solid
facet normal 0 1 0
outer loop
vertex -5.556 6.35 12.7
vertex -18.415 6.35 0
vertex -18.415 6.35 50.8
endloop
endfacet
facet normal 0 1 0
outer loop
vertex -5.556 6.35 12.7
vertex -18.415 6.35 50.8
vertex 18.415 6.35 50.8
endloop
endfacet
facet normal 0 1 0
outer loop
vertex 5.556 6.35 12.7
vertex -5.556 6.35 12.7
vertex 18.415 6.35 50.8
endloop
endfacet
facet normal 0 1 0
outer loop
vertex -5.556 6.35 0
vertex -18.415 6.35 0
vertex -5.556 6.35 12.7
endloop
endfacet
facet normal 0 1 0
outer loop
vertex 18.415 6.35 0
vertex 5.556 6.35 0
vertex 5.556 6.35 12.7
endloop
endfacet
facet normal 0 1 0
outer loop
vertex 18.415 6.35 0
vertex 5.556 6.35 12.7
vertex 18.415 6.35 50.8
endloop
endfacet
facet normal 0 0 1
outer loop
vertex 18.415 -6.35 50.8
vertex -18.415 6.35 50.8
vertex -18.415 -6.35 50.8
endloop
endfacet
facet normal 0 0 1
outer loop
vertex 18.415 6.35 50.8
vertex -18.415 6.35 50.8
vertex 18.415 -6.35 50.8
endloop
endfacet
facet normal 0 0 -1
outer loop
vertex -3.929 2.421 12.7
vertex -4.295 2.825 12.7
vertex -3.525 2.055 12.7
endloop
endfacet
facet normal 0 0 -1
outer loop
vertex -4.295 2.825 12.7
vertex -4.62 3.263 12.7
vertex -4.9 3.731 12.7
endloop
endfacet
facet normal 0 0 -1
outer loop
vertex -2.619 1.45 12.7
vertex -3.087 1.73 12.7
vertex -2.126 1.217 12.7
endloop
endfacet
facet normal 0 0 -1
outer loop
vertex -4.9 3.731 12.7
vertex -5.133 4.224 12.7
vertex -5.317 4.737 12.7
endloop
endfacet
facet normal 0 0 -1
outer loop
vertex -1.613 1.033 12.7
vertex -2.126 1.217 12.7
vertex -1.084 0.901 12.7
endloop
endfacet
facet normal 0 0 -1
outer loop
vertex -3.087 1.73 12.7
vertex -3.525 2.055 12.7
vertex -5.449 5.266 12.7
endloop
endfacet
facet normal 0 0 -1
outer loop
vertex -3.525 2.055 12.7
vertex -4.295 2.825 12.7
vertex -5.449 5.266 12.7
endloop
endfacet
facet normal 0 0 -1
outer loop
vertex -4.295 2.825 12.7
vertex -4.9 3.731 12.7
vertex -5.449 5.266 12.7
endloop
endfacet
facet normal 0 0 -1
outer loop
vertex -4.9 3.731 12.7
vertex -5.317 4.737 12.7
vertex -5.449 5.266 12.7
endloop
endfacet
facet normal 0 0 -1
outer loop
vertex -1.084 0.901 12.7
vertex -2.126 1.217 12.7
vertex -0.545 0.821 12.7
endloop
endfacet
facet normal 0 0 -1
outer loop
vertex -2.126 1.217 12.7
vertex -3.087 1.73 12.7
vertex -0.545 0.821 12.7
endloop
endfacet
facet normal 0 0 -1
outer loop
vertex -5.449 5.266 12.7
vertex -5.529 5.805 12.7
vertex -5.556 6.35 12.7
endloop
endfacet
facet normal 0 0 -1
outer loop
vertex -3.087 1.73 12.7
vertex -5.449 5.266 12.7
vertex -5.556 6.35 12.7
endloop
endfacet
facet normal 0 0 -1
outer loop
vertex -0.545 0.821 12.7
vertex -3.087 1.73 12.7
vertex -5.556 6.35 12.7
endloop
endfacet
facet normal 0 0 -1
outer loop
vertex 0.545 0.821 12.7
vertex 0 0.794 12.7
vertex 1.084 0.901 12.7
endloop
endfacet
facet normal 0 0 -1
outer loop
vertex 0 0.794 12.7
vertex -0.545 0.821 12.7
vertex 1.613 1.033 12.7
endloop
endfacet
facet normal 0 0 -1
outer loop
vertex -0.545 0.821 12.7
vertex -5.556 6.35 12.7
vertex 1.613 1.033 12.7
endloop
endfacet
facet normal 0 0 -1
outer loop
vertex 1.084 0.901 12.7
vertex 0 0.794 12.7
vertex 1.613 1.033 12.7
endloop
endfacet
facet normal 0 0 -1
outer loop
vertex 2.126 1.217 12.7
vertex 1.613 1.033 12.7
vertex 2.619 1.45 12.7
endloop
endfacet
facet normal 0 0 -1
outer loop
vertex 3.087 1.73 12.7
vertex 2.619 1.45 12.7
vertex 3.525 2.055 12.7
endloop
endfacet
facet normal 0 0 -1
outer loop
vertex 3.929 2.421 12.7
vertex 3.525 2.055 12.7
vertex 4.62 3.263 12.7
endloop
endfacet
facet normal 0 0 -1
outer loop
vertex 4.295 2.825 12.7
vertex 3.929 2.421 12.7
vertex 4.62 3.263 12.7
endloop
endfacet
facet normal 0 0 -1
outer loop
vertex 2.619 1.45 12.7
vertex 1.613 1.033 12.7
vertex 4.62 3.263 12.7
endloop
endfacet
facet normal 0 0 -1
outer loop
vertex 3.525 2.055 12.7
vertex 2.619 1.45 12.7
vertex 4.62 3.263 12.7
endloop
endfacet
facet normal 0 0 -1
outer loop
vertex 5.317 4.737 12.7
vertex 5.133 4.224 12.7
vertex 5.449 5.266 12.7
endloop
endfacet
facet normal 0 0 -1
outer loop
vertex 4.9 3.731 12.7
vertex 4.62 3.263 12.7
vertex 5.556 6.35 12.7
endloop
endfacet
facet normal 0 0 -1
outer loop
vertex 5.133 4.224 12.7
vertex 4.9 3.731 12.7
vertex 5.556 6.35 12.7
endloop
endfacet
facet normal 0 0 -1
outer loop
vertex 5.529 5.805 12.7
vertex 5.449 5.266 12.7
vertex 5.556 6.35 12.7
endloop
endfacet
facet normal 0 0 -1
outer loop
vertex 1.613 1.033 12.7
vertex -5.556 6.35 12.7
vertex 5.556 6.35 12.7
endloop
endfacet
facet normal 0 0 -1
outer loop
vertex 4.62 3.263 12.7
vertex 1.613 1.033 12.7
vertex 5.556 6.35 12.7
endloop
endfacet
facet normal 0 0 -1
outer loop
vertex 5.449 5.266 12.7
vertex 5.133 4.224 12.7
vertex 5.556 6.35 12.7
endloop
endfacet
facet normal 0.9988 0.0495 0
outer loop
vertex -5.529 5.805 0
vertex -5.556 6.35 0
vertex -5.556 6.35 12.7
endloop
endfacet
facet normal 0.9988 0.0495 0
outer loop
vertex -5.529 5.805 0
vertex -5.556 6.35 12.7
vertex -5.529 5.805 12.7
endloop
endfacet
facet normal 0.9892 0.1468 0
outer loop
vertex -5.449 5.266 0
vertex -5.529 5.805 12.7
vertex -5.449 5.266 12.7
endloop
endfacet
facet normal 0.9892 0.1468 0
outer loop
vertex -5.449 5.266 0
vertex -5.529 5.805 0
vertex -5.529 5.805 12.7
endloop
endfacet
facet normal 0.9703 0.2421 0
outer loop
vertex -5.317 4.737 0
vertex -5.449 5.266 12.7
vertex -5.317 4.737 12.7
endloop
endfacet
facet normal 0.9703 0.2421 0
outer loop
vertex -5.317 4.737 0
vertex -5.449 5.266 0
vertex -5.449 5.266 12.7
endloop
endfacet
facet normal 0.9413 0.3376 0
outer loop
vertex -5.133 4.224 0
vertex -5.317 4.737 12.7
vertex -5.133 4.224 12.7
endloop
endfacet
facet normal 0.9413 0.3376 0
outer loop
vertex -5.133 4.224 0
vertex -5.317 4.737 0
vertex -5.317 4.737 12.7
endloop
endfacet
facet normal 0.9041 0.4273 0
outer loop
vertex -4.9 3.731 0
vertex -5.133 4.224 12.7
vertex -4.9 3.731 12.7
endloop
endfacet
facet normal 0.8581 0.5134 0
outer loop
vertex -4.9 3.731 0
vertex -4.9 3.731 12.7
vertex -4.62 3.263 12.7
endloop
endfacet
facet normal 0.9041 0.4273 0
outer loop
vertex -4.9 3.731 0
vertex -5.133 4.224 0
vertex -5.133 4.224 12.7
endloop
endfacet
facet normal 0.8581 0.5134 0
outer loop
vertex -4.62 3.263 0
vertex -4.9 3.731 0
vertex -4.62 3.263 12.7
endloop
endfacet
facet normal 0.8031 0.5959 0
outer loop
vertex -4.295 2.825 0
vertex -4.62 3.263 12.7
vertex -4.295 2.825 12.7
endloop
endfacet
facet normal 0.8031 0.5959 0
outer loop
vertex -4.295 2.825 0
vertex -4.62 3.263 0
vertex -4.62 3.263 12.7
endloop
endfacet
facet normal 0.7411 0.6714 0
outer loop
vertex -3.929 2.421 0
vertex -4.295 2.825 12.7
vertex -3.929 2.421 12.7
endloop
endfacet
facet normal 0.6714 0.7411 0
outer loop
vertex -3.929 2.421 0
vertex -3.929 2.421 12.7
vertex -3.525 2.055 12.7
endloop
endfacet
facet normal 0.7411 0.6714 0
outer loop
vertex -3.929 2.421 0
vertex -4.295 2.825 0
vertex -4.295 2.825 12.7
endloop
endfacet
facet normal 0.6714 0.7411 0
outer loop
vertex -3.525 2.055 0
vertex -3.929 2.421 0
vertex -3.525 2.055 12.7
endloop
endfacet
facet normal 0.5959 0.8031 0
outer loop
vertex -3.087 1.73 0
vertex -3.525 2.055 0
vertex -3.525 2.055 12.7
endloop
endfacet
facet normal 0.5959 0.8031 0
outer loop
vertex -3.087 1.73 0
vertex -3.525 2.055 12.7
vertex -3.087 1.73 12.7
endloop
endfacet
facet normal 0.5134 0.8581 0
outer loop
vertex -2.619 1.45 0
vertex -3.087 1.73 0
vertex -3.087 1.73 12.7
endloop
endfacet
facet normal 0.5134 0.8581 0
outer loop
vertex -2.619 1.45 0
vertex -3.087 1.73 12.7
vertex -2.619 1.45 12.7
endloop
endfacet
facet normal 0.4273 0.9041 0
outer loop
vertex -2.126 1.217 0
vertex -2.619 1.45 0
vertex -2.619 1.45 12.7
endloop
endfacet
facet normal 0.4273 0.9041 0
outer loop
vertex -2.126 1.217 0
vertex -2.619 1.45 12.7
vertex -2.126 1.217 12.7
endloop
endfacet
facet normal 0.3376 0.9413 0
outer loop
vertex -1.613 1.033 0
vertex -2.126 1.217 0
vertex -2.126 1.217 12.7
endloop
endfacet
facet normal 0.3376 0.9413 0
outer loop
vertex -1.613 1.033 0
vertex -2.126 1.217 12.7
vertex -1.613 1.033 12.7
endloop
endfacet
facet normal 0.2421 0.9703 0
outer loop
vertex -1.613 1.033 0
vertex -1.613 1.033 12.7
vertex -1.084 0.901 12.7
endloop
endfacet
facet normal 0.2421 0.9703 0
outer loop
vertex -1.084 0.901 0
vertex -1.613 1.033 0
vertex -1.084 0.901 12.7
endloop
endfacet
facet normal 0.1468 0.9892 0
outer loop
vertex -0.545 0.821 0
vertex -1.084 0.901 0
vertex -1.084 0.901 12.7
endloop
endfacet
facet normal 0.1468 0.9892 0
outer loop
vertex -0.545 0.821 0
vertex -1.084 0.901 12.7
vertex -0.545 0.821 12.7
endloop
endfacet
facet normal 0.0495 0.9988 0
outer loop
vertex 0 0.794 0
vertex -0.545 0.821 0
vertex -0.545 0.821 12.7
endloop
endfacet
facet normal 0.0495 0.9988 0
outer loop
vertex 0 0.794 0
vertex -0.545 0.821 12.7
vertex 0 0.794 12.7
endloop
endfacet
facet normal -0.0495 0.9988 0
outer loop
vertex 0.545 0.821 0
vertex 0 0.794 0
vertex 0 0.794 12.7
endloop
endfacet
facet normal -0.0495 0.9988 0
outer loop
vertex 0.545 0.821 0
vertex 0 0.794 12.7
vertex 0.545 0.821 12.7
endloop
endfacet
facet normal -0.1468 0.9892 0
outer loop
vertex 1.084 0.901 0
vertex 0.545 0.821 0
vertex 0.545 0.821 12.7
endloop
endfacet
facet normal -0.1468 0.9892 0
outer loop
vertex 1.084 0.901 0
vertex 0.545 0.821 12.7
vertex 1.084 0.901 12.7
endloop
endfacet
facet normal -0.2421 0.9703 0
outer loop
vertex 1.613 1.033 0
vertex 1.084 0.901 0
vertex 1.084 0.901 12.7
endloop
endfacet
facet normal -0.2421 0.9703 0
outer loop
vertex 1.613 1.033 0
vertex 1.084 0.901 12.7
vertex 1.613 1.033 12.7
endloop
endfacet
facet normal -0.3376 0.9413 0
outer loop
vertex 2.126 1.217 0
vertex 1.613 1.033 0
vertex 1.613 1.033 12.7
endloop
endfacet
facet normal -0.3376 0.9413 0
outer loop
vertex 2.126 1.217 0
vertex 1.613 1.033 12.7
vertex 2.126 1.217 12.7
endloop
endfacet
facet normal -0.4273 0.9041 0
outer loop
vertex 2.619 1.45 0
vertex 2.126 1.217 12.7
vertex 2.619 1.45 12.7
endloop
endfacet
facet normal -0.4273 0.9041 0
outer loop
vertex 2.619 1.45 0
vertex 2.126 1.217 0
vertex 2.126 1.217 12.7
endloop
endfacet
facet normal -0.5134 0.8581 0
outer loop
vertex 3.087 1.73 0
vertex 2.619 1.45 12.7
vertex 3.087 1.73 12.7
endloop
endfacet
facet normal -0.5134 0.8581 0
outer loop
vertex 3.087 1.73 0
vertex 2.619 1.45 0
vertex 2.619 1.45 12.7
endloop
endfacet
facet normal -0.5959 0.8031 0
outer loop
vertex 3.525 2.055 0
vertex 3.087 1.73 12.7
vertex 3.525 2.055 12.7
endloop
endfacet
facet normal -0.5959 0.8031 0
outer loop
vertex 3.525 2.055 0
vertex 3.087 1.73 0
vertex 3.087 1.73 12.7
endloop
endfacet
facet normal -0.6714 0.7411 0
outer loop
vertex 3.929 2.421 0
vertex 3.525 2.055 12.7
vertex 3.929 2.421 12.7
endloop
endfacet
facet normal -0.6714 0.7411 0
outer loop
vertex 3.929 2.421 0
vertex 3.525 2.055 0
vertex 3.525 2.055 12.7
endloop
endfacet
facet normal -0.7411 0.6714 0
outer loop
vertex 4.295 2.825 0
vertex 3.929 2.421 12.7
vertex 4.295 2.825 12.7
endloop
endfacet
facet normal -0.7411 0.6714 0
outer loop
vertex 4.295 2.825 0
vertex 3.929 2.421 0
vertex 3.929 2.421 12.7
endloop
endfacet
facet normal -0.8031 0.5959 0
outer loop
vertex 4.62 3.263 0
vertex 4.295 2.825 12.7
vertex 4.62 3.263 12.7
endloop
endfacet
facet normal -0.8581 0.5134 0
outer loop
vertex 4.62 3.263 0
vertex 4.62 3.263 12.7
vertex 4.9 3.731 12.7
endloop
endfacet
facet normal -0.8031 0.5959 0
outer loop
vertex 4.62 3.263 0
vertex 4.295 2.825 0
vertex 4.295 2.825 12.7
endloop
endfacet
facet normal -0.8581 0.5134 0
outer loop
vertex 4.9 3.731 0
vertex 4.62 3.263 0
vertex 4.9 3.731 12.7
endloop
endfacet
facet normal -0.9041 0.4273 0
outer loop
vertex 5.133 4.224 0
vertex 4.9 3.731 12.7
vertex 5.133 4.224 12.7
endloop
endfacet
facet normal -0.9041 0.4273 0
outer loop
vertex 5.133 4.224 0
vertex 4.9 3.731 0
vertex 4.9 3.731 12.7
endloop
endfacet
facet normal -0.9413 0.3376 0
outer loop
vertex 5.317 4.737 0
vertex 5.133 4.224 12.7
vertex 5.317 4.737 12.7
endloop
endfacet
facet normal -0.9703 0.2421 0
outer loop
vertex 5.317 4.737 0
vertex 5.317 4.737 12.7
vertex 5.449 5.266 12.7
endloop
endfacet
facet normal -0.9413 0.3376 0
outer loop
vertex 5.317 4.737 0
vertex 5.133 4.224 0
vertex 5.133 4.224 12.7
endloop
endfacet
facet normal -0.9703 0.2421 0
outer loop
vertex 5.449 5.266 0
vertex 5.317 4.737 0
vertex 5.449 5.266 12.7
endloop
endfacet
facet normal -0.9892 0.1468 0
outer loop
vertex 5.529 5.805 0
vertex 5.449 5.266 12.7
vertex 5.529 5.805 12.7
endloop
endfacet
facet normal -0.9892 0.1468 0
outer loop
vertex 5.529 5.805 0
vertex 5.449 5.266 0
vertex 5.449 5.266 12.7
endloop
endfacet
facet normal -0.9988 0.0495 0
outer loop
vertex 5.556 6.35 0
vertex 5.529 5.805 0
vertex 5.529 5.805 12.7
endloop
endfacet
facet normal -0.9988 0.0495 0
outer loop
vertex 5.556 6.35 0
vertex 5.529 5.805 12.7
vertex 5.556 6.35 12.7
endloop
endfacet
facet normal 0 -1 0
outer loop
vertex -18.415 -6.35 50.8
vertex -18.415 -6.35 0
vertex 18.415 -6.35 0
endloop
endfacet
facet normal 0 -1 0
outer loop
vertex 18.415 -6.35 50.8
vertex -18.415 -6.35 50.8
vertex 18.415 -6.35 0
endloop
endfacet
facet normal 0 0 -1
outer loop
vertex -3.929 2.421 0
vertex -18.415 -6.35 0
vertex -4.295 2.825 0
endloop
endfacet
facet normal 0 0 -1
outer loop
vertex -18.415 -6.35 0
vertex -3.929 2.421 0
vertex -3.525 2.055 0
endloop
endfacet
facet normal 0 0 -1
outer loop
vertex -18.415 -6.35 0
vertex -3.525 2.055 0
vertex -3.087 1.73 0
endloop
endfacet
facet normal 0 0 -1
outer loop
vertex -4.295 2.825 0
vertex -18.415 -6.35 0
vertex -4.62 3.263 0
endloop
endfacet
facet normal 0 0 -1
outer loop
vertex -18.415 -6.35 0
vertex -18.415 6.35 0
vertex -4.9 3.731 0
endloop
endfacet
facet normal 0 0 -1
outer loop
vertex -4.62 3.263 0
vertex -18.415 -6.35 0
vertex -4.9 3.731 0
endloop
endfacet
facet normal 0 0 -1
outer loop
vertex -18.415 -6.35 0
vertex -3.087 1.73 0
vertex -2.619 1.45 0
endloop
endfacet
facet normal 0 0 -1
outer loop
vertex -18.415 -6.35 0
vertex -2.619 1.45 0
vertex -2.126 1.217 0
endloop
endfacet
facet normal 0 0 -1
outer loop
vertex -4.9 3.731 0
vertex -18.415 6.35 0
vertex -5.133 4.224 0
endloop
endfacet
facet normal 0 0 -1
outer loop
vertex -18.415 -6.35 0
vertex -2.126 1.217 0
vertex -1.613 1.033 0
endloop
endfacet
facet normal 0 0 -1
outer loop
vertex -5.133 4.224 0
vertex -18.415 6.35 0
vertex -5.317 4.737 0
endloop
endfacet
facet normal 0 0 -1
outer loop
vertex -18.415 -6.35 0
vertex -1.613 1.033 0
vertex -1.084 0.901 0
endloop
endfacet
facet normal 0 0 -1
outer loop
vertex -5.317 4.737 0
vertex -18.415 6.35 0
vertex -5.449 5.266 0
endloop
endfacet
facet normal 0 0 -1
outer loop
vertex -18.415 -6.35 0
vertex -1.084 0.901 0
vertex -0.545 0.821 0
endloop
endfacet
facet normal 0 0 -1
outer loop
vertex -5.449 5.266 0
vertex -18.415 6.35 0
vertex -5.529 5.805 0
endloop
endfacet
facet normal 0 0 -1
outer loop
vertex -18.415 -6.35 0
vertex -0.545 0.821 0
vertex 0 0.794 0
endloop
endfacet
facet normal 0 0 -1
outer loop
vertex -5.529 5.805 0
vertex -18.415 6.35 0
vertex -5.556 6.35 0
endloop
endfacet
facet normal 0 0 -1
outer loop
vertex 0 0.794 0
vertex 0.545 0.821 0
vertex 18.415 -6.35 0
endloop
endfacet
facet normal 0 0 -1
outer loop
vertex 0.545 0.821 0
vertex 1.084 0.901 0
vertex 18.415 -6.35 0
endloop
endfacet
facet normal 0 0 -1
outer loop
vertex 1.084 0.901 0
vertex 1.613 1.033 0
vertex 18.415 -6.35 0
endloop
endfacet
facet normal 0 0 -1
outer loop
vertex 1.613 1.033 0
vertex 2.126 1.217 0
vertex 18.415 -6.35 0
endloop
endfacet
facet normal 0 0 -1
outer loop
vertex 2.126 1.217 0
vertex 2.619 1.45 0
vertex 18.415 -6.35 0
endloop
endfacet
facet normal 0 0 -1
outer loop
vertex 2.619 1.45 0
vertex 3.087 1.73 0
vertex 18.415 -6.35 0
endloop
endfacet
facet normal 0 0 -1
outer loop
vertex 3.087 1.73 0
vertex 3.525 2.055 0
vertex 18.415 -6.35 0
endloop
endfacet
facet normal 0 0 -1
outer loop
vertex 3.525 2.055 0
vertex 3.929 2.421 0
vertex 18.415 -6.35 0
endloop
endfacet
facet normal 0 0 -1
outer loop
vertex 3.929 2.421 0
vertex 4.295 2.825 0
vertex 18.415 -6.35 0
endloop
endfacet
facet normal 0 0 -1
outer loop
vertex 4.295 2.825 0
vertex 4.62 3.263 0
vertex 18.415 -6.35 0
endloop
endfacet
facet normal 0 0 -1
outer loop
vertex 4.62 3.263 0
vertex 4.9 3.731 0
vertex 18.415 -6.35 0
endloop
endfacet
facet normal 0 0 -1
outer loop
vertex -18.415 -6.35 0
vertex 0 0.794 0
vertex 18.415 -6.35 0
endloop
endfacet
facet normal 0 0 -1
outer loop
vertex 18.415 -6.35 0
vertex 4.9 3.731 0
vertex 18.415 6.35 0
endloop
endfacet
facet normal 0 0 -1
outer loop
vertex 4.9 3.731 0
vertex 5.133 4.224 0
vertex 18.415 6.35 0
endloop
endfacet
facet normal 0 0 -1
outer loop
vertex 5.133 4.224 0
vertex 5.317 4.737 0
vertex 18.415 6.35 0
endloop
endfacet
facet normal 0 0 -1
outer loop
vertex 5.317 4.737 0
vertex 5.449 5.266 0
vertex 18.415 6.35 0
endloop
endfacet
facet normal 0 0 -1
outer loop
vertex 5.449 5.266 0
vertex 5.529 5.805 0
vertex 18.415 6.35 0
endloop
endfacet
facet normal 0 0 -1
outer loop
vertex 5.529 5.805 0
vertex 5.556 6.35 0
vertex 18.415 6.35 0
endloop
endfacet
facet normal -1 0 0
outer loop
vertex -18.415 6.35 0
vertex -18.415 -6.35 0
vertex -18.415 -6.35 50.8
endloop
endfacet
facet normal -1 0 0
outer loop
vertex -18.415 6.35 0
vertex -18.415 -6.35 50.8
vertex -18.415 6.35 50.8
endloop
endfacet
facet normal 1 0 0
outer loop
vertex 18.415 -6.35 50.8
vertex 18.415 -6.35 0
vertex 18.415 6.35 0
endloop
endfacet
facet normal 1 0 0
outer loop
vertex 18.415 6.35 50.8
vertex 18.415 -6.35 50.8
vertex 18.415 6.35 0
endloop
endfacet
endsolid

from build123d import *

# Parameters (mm, degrees)
SKETCH1_W           = 36.83
SKETCH1_H           = 12.7
BOSS_EXTRUDE1_DEPTH = 50.8
SKETCH3_R           = 5.55625
CUT_EXTRUDE1_DEPTH  = 12.7


with BuildPart() as part:
    # Sketch1 → Boss-Extrude1 (new body)
    with BuildSketch(Plane.XY):
        Rectangle(SKETCH1_W, SKETCH1_H)
    extrude(amount=BOSS_EXTRUDE1_DEPTH)

    # Sketch3 → Cut-Extrude1 (cut)
    with BuildSketch(Plane.XY):
        with Locations((0, 6.35)):
            Circle(SKETCH3_R)
    extrude(amount=CUT_EXTRUDE1_DEPTH, mode=Mode.SUBTRACT)


solid = part.part
